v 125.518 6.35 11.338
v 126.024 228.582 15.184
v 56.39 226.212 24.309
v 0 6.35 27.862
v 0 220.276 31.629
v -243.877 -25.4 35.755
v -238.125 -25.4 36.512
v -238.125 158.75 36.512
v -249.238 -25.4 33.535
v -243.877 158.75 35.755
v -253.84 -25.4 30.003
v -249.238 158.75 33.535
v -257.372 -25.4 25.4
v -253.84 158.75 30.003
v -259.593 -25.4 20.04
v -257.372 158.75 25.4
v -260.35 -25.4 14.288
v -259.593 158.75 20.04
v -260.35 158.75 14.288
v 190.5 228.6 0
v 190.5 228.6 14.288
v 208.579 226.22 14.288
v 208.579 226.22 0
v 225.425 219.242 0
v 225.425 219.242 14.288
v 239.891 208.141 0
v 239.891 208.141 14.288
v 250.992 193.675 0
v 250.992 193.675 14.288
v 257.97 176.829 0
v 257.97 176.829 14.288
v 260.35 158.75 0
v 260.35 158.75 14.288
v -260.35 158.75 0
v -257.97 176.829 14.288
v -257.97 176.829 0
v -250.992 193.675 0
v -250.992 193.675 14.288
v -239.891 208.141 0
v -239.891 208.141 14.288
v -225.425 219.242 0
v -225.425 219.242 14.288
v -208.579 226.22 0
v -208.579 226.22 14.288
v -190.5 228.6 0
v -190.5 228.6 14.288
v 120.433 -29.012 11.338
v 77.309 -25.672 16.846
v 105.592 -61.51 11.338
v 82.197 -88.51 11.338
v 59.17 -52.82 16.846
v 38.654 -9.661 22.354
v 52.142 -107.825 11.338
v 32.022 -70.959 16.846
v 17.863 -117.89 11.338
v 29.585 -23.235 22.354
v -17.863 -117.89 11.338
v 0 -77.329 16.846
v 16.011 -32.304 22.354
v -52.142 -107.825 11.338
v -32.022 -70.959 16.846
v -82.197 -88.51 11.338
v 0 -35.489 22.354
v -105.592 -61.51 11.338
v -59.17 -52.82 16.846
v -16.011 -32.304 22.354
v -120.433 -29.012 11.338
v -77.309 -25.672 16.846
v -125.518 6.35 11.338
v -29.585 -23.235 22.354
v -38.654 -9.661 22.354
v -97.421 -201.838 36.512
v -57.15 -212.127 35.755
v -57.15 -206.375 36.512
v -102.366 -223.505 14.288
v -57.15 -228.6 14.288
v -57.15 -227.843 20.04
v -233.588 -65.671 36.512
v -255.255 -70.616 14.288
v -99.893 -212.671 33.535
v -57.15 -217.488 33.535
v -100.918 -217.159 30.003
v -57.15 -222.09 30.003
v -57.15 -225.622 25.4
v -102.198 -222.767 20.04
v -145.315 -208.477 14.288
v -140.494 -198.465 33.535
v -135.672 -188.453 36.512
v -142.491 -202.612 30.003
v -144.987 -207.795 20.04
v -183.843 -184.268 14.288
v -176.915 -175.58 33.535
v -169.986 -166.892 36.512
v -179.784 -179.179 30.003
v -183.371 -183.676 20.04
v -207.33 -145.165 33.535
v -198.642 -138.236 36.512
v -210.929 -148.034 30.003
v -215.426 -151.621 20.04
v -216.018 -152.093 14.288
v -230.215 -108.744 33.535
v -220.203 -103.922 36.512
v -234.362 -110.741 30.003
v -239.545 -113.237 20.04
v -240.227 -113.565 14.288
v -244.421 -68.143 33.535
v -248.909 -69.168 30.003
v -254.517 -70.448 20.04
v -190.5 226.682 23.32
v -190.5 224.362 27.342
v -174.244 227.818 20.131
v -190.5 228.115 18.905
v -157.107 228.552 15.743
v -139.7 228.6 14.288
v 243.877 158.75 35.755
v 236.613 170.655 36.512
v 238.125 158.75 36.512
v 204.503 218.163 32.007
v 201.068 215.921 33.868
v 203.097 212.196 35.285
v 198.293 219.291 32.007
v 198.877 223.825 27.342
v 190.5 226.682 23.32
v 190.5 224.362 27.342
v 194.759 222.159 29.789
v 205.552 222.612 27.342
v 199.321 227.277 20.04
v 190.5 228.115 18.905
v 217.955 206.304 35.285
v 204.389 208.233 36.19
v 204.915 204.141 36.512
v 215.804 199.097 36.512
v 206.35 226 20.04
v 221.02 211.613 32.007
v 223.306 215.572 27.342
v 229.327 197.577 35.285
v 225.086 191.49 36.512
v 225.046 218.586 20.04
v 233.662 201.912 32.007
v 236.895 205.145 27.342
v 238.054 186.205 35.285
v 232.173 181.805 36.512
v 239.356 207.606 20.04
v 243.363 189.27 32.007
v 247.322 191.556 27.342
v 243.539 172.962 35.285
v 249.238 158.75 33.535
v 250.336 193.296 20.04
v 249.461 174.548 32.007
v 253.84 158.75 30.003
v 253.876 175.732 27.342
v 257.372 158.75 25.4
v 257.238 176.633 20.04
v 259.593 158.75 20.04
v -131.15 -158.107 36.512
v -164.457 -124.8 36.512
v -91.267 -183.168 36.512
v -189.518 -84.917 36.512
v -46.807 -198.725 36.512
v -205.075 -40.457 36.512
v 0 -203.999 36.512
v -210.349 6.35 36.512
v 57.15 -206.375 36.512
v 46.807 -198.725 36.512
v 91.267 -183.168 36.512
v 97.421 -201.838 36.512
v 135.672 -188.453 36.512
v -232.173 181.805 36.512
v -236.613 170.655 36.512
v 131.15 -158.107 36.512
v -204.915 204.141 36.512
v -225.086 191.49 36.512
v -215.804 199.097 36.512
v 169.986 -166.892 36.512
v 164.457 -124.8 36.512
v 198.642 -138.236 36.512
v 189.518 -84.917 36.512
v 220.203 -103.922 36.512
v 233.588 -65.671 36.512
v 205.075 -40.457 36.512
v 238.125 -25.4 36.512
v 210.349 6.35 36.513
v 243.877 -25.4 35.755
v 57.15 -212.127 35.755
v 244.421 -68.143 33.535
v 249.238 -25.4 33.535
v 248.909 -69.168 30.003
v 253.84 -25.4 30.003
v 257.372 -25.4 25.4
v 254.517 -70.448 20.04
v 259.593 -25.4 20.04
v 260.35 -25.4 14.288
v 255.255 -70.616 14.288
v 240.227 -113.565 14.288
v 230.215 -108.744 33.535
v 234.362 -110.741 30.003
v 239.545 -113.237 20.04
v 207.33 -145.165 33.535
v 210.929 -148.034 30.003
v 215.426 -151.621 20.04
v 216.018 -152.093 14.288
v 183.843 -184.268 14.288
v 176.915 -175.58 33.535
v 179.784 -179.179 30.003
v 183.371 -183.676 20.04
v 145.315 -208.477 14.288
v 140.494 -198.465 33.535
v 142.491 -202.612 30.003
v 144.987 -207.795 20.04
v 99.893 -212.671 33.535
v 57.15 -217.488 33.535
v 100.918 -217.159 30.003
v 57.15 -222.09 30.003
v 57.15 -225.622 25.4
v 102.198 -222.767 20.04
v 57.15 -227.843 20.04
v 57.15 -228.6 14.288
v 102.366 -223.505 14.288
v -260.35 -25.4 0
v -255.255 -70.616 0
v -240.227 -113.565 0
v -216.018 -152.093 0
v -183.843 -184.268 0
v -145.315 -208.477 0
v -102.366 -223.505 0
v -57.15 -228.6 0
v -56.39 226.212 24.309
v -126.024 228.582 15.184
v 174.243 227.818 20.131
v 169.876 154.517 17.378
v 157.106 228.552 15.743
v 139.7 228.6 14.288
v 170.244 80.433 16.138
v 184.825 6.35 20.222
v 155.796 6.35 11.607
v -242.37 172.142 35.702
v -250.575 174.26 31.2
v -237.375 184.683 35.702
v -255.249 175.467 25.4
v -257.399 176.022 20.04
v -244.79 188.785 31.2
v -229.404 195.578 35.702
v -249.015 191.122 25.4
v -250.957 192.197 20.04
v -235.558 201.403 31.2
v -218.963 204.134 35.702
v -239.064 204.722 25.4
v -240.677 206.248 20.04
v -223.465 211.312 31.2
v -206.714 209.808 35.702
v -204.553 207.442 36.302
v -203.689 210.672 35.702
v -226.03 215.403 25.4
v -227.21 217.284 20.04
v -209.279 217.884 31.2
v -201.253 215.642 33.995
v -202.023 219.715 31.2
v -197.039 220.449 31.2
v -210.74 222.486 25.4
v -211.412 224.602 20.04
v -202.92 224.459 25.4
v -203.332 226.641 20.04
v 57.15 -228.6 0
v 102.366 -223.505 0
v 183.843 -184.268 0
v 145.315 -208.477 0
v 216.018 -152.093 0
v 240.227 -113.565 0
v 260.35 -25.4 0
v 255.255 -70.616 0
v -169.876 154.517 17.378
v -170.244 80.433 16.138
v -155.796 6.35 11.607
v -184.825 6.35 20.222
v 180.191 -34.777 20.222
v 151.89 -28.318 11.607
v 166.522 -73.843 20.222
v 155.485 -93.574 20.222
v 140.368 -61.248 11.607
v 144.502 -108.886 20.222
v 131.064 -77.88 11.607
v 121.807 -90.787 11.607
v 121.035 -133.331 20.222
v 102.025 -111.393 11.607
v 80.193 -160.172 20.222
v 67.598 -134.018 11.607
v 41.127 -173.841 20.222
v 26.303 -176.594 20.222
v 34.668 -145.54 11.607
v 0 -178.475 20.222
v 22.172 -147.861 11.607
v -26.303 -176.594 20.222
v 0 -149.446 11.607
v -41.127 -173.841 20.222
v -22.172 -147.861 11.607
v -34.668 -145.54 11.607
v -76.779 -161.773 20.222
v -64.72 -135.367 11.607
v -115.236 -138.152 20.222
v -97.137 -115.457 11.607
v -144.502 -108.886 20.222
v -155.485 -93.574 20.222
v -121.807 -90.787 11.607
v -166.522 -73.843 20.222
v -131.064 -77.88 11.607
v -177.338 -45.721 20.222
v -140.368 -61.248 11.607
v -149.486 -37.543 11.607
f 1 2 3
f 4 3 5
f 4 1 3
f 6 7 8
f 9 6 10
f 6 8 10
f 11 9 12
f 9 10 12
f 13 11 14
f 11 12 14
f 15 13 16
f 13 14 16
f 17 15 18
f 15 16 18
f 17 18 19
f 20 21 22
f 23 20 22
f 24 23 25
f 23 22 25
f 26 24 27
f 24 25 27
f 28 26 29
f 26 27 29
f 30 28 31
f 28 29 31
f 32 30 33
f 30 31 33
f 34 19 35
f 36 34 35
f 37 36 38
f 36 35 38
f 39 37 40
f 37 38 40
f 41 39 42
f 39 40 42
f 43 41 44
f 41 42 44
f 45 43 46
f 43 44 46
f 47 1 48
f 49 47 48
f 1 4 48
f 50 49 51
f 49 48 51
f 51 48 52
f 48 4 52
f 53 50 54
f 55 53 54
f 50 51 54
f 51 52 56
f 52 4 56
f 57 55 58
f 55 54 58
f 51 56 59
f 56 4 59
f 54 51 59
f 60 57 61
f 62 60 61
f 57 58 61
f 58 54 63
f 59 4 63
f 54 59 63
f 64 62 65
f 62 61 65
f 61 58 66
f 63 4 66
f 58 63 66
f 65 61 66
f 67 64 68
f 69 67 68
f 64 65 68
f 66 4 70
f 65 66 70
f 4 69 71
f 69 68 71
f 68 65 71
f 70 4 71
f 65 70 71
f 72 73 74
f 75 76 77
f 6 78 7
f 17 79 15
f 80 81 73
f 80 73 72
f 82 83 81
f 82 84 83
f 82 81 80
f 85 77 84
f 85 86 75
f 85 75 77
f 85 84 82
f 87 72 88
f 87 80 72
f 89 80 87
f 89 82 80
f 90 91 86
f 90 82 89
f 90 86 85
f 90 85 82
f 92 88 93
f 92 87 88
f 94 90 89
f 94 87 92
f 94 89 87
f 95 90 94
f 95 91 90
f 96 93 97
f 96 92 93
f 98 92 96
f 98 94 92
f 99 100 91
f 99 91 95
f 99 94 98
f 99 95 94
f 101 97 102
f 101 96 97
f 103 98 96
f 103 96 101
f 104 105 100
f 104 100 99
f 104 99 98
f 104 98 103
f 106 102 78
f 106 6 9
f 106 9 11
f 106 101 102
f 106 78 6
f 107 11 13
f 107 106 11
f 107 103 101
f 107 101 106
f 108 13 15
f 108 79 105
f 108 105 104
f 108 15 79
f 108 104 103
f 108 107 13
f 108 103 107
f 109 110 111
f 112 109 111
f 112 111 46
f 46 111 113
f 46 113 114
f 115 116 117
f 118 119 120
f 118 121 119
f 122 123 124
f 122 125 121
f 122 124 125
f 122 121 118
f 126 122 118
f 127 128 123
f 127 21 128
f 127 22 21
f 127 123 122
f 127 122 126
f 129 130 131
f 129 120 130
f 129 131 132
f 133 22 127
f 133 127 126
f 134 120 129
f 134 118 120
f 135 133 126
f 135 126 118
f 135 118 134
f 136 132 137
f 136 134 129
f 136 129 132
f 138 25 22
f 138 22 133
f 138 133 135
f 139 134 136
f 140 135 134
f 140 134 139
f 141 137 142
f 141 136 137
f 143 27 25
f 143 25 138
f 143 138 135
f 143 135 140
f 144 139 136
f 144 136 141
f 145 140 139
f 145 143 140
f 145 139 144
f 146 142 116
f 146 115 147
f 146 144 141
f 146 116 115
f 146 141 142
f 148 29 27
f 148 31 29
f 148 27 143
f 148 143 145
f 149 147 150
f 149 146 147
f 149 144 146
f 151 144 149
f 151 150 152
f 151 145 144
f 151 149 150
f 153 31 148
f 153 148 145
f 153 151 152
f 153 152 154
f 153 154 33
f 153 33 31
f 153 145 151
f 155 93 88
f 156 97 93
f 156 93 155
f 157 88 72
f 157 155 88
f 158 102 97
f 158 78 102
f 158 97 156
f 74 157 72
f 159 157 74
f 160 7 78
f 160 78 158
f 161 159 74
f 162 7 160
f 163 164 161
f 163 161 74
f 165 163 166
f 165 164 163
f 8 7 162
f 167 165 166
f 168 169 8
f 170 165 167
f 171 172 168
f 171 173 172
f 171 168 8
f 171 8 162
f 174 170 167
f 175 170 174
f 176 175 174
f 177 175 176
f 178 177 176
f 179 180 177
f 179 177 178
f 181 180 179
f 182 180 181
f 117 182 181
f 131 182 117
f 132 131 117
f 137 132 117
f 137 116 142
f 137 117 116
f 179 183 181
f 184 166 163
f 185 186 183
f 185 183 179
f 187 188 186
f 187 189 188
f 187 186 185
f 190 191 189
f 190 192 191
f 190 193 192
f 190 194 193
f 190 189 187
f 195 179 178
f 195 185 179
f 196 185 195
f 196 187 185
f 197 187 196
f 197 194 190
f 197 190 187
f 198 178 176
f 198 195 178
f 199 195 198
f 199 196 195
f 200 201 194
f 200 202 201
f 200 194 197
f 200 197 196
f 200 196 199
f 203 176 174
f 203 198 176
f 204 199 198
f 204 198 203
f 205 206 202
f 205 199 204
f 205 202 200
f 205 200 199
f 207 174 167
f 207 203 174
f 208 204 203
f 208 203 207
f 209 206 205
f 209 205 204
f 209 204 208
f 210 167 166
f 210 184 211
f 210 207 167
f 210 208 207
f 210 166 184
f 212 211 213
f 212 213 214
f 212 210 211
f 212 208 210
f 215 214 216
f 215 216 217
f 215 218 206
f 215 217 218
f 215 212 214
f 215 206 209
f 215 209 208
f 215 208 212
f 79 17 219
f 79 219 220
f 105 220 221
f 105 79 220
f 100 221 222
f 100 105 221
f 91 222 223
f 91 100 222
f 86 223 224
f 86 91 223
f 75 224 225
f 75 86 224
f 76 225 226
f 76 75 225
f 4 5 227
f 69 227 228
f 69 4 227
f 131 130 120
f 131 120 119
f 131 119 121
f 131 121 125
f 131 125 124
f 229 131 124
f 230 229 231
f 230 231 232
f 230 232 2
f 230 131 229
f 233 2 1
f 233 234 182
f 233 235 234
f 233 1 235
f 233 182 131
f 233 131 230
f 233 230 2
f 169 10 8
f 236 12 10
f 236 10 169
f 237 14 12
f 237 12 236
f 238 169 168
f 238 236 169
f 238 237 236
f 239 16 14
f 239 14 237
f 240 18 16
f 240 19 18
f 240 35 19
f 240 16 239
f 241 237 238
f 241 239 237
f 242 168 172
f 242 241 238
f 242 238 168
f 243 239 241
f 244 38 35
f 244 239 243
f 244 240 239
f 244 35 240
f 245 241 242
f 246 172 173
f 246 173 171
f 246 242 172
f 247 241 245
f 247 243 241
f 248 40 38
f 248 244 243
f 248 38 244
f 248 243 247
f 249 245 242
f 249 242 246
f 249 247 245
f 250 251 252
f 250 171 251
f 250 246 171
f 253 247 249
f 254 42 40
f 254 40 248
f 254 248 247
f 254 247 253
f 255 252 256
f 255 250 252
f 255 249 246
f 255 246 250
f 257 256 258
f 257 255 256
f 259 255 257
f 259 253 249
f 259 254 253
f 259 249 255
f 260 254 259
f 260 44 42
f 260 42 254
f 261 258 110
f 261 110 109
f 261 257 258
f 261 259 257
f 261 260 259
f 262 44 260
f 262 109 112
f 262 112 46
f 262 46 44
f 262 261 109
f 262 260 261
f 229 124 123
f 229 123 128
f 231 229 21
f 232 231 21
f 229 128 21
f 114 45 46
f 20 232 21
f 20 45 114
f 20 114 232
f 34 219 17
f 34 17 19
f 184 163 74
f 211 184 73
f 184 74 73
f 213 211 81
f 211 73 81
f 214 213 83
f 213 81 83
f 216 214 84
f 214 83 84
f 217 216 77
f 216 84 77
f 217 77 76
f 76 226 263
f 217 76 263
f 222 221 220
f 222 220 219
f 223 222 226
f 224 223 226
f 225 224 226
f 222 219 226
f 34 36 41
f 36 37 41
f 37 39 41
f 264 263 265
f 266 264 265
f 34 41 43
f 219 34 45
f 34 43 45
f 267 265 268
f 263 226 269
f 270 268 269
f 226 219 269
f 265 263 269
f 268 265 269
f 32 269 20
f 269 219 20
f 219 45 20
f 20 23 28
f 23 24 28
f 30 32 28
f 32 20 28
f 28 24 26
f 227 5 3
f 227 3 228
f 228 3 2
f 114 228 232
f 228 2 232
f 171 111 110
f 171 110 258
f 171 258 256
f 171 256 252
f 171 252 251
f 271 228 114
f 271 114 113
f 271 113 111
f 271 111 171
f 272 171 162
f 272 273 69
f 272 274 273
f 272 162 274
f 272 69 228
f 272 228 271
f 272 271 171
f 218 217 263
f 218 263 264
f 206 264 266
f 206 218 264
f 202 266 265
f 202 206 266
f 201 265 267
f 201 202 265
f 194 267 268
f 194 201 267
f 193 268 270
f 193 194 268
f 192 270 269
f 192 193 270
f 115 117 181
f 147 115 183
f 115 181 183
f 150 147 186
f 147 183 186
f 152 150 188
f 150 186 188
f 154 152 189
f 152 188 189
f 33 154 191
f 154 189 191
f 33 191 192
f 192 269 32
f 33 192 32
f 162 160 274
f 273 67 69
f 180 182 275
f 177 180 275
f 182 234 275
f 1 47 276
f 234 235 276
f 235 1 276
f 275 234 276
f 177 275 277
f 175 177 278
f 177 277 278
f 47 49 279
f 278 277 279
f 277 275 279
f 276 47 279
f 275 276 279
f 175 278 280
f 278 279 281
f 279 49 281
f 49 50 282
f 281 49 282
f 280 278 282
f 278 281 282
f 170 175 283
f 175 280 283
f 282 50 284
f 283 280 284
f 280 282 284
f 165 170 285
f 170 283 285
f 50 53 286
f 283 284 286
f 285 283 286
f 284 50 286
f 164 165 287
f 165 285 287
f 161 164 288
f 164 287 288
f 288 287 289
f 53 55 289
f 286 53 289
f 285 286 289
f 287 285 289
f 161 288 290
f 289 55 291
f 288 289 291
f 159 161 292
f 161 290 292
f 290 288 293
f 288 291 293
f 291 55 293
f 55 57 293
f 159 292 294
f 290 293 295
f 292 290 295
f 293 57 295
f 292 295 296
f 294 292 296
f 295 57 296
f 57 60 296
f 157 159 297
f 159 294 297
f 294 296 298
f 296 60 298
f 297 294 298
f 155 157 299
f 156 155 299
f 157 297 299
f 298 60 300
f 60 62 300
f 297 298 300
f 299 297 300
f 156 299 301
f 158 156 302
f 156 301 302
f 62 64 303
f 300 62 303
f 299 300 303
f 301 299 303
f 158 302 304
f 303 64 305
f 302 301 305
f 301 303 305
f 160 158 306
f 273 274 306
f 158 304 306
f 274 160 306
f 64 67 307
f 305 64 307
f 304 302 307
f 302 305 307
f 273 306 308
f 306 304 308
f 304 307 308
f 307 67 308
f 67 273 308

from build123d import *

# Parameters (mm, degrees)
F0_W     = 520.7
F0_H     = 457.2
F1_DEPTH = 36.5125
F2_R     = 203.2
F3_R     = 69.85
F4_R     = 22.225
F6_DEPTH = 222.25
F6_TAPER = -1
F8_ANGLE = 180


# Not quite as in the source:
# - a feature names something its author has since deleted; it is built from what else it names


with BuildPart() as f1:
    # F0 (on Top) → F1 (new body)
    with BuildSketch(Plane.XY):
        Rectangle(F0_W, F0_H)
    extrude(amount=F1_DEPTH)

    # F2
    f2_edges = [f1.edges().sort_by_distance(p)[0] for p in [
        (-260.35, -228.6, 18.25625),
        (260.35, -228.6, 18.25625),
    ]]
    fillet(f2_edges, radius=F2_R)

    # F3
    f3_edges = [f1.edges().sort_by_distance(p)[0] for p in [
        (260.35, 228.6, 18.25625),
        (-260.35, 228.6, 18.25625),
    ]]
    fillet(f3_edges, radius=F3_R)

    # F4
    f4_edges = [f1.edges().sort_by_distance(p)[0] for p in [
        (0, 228.6, 36.5125),
    ]]
    fillet(f4_edges, radius=F4_R)

    # F5 (on face) → F6 (cut)
    with BuildSketch(Plane(origin=(0, 228.6, 0), x_dir=(-1, 0, 0), z_dir=(0, 1, 0))):
        with BuildLine():
            Line((0, 181.2540946981), (-105.1541626057, 217.9785540242))
            ThreePointArc((-105.1541626057, 217.9785540242), (-243.9245415433, 129.7884295676), (-126.0241182101, 15.1838646496))
            Line((-126.0241182101, 15.1838646496), (0, 31.7752545682))
            Line((0, 31.7752545682), (126.0241182101, 15.1838646496))
            ThreePointArc((126.0241182101, 15.1838646496), (243.9245415433, 129.7884295676), (105.1541626057, 217.9785540242))
            Line((105.1541626057, 217.9785540242), (0, 181.2540946981))
        make_face()
    extrude(amount=-F6_DEPTH, taper=F6_TAPER, mode=Mode.SUBTRACT)

    # F7 (on face) → F8 (revolve, cut)
    with BuildSketch(Plane(origin=(0, 6.35, 0), x_dir=(-1, 0, 0), z_dir=(0, 1, 0))):
        with BuildLine():
            Line((0, 36.5125), (-210.3489459995, 36.5125))
            ThreePointArc((-210.3489459995, 36.5125), (-170.6122176221, 14.8981545045), (-125.5177564428, 11.3376651729))
            Line((-125.5177564428, 11.3376651729), (0, 27.8623913002))
            Line((0, 27.8623913002), (0, 36.5125))
        make_face()
    revolve(axis=Axis((0, 6.35, 32.1874456501), (0, 0, -1)), revolution_arc=F8_ANGLE, mode=Mode.SUBTRACT)


solid = f1.part
